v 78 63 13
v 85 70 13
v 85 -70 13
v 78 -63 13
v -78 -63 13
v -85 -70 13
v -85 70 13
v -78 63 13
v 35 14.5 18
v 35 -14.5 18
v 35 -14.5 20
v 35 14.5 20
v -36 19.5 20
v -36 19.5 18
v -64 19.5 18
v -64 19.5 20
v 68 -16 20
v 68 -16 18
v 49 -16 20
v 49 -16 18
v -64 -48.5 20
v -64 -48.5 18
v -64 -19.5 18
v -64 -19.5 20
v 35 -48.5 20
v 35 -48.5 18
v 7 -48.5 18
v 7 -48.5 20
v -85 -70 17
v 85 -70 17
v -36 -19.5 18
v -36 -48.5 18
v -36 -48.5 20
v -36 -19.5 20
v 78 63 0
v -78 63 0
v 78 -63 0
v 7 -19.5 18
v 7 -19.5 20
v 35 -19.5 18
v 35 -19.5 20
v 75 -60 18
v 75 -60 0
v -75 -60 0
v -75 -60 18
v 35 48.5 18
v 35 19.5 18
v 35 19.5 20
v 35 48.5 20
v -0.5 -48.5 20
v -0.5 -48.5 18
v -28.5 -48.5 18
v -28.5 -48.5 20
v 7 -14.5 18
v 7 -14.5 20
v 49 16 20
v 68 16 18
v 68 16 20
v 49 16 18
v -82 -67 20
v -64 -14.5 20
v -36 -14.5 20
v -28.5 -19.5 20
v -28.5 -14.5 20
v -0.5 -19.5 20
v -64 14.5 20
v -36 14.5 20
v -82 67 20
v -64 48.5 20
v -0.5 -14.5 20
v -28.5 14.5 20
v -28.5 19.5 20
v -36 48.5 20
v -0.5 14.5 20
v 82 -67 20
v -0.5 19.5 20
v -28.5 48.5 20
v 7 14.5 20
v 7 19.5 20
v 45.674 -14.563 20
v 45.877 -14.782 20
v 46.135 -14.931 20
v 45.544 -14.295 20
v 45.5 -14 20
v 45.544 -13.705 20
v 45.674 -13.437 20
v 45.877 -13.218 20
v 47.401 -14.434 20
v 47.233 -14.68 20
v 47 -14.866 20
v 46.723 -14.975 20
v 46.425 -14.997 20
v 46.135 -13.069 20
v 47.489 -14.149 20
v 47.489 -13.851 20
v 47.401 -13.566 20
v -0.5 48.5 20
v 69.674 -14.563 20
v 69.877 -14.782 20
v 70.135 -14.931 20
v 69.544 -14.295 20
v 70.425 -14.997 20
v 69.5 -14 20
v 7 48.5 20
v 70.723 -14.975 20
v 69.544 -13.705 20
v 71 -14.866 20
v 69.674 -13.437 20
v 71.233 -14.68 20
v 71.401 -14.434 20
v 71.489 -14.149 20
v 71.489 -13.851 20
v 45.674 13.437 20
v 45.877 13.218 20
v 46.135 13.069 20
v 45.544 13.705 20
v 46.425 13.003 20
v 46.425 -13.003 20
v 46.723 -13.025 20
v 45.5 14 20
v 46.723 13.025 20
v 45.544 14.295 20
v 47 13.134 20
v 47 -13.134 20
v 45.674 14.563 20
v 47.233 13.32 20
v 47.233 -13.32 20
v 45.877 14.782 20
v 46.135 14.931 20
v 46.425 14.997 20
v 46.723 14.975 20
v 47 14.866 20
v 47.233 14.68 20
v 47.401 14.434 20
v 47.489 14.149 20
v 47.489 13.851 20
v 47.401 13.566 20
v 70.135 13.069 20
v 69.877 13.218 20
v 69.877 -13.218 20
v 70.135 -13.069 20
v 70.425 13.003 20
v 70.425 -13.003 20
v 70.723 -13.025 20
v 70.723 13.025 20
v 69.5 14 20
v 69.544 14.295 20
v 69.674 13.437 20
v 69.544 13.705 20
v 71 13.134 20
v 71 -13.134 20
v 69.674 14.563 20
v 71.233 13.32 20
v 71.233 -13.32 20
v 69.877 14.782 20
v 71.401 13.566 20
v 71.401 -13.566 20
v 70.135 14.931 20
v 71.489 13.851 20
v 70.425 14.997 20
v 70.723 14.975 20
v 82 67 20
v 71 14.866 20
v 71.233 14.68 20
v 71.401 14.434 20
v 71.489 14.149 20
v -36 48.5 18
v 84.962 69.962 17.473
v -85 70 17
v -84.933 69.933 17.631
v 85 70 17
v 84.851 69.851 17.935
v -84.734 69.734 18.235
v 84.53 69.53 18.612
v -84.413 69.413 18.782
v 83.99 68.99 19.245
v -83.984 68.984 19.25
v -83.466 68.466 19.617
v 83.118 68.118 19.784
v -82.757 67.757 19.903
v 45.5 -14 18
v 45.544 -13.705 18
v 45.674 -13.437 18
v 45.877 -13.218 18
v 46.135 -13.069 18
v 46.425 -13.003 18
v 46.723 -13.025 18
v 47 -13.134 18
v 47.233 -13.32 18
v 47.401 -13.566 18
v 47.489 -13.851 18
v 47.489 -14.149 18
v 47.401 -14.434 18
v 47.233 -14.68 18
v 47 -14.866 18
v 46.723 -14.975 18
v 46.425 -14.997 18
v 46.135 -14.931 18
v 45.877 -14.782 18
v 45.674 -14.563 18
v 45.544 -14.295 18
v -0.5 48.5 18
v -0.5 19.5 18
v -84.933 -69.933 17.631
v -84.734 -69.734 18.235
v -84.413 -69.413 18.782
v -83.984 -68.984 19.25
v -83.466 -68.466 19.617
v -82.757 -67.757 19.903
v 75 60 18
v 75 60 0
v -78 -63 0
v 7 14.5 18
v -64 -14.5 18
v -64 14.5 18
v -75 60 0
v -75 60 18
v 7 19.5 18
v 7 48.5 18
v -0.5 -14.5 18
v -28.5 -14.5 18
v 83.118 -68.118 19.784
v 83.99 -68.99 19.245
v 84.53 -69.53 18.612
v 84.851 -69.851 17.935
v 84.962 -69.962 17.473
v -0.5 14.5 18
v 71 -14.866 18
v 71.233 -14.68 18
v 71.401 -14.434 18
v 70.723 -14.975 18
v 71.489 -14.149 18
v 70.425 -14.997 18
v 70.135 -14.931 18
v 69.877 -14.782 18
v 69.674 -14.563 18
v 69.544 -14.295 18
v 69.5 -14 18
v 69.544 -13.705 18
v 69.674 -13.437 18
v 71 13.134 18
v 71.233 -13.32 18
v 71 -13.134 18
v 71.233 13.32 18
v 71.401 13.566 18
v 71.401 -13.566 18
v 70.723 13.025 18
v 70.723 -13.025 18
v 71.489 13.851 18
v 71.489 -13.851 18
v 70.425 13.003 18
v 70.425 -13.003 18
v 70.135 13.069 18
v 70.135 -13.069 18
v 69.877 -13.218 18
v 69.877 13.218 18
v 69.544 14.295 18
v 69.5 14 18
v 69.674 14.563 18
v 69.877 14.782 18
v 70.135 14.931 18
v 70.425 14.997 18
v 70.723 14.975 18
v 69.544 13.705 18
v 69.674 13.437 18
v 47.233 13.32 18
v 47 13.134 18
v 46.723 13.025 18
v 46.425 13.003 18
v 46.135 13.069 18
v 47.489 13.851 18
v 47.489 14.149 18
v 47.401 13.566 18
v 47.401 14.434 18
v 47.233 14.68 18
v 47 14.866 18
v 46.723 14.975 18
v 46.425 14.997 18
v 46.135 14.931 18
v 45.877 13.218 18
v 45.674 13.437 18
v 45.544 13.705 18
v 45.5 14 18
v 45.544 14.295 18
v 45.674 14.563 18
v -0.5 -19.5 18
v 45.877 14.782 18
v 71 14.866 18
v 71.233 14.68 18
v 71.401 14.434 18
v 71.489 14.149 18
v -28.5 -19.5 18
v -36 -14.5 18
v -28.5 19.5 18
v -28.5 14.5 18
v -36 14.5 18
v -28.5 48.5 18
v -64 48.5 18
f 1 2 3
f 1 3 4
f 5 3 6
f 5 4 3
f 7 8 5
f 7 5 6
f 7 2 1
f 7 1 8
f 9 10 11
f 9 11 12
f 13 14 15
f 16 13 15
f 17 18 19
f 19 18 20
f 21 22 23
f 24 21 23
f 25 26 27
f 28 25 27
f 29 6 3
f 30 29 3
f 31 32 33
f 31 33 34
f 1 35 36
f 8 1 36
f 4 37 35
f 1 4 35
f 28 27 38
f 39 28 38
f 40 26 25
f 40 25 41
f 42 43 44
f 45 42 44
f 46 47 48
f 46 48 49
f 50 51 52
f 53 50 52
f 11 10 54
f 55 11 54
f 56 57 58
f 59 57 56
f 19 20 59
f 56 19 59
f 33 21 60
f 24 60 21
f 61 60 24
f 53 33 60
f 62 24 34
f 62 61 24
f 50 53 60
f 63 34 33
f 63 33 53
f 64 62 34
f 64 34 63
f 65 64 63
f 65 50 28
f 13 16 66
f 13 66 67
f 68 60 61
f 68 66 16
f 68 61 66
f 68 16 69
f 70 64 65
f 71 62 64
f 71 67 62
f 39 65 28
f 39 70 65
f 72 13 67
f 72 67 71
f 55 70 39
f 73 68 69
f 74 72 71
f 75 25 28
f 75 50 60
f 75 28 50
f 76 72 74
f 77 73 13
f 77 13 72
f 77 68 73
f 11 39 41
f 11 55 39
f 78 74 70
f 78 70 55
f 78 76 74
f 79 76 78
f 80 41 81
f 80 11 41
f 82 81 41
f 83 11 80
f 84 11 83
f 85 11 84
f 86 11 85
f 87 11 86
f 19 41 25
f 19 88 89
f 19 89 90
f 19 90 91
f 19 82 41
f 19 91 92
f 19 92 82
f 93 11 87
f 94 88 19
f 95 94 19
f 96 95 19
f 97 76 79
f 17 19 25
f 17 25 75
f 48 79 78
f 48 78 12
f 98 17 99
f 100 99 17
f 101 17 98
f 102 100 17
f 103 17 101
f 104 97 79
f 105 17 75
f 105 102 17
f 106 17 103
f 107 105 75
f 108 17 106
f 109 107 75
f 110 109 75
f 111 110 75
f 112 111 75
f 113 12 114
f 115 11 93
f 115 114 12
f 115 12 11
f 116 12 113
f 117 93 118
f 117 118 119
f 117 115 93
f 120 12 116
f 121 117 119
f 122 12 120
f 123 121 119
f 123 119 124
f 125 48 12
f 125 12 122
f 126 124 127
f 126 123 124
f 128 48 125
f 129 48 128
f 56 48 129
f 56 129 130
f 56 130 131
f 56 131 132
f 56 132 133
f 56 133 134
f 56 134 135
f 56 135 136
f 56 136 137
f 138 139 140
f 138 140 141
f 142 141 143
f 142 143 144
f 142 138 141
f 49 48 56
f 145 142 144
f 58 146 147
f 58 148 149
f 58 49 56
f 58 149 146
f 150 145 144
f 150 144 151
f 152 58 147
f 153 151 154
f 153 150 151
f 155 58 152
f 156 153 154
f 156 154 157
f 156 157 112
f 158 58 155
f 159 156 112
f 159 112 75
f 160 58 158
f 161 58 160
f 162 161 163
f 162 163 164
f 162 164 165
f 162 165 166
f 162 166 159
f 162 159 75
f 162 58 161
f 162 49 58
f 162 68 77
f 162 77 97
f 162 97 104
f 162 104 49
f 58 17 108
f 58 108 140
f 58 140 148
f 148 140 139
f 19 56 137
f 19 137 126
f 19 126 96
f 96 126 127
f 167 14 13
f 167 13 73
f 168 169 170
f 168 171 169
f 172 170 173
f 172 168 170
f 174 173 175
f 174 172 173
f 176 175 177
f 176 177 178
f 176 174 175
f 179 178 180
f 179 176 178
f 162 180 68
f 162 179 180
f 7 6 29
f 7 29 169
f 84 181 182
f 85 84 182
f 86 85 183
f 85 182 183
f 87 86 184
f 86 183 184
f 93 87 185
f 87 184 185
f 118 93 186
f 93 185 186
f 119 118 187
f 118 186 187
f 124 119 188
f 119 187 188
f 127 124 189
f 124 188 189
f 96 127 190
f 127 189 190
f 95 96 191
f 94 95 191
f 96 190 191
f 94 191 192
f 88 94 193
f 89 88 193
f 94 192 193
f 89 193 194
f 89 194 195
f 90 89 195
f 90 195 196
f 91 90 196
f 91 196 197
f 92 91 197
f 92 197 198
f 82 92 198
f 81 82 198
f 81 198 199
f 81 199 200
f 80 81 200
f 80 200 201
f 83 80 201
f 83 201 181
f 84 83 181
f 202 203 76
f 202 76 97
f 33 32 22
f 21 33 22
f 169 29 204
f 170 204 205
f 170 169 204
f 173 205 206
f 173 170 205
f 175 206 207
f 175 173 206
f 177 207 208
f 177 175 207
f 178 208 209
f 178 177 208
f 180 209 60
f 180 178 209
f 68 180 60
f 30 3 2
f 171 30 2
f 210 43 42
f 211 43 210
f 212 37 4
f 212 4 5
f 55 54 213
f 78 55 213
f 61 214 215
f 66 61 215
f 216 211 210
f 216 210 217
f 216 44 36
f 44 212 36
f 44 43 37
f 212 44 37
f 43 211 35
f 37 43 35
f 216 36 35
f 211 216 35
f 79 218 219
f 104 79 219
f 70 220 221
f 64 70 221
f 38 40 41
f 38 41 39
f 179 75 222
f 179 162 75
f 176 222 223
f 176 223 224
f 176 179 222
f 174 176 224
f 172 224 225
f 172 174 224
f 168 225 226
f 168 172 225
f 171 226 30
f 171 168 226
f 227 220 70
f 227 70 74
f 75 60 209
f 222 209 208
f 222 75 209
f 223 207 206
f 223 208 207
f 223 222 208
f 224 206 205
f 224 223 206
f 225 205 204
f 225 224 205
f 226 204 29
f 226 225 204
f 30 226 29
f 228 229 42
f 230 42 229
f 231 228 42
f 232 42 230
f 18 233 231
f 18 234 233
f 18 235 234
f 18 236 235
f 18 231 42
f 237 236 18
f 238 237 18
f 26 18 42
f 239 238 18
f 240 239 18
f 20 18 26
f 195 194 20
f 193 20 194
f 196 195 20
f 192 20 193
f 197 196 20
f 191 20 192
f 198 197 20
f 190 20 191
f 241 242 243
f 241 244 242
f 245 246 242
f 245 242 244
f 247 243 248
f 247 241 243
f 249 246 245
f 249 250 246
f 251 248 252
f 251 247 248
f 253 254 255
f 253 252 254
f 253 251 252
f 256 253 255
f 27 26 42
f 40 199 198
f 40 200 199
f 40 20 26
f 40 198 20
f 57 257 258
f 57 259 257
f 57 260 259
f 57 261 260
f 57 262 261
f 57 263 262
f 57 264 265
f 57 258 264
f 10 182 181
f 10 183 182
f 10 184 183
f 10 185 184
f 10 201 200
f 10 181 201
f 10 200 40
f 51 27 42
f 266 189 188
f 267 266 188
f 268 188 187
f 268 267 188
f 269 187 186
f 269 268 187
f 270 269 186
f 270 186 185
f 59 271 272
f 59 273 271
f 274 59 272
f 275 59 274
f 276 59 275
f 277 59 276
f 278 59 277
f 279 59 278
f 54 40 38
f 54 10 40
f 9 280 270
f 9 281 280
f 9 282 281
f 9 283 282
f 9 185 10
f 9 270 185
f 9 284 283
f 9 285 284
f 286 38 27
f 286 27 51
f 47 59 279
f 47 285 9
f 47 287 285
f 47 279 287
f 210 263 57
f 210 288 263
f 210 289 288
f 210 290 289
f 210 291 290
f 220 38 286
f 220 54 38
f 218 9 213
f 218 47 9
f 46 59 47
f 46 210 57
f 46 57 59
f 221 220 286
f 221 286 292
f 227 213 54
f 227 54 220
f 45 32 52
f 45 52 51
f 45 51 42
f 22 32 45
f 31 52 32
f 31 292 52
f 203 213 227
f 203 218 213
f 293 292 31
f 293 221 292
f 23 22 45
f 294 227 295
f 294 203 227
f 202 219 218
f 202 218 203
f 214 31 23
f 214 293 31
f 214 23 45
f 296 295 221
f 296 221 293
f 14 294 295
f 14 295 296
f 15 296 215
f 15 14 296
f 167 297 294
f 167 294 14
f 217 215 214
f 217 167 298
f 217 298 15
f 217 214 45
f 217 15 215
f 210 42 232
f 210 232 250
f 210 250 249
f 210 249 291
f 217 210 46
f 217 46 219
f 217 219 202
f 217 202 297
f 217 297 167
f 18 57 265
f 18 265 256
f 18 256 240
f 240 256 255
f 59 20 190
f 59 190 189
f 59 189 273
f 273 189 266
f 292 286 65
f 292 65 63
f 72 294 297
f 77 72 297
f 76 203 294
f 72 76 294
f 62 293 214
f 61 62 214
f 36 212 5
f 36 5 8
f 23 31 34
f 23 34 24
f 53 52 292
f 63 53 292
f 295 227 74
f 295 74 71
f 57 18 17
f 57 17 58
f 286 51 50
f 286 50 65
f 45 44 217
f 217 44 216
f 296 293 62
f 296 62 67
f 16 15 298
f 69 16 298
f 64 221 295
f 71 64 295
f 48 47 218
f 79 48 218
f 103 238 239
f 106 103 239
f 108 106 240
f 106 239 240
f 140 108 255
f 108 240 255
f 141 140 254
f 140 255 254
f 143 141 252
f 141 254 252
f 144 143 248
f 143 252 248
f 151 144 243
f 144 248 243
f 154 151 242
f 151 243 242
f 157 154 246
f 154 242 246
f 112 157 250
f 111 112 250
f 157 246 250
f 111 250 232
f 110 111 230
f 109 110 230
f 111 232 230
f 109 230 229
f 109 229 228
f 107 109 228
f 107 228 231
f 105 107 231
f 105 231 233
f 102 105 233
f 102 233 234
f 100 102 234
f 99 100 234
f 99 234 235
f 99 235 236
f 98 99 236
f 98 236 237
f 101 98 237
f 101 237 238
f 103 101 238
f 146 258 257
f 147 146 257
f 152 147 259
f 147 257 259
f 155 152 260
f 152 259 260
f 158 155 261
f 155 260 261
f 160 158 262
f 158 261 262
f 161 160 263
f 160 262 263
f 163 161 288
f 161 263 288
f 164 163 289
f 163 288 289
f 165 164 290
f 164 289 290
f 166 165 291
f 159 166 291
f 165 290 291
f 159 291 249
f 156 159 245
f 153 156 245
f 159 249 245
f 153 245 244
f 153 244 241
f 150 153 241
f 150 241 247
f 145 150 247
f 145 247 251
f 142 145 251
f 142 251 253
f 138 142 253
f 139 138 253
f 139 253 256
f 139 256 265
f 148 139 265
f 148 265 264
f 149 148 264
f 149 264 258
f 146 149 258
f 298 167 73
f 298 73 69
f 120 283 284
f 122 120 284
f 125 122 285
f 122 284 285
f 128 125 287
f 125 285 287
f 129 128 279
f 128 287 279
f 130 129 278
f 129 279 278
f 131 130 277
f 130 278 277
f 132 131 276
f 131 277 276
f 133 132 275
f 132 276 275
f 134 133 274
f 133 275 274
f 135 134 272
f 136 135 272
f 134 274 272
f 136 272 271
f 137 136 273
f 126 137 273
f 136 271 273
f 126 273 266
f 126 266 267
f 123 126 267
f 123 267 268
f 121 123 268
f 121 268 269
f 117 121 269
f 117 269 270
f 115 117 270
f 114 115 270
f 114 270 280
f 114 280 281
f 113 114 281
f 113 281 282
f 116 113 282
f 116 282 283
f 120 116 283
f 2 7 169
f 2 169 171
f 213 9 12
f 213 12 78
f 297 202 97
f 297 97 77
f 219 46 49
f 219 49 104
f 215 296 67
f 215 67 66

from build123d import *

# Parameters (mm, degrees)
CROQUIS1_W              = 170
CROQUIS1_H              = 140
SALIENTE_EXTRUIR1_DEPTH = 20
CROQUIS2_W              = 170
CROQUIS2_H              = 140
CROQUIS2_W_2            = 156
CROQUIS2_H_2            = 126
CORTAR_EXTRUIR1_DEPTH   = 13
CROQUIS3_W              = 150
CROQUIS3_H              = 120
CORTAR_EXTRUIR2_DEPTH   = 18
CROQUIS4_R              = 1
CROQUIS4_W              = 28
CROQUIS4_H              = 29
CROQUIS4_W_2            = 19
CROQUIS4_H_2            = 32
CORTAR_EXTRUIR3_DEPTH   = 18
REDONDEO1_R             = 3


with BuildPart() as part:
    # Croquis1 → Saliente-Extruir1 (new body)
    with BuildSketch(Plane.XY):
        Rectangle(CROQUIS1_W, CROQUIS1_H)
    extrude(amount=SALIENTE_EXTRUIR1_DEPTH)

    # Croquis2 → Cortar-Extruir1 (cut)
    with BuildSketch(Plane(origin=(0, 0, 0), x_dir=(-1, 0, 0), z_dir=(0, 0, -1))):
        Rectangle(CROQUIS2_W, CROQUIS2_H)
        Rectangle(CROQUIS2_W_2, CROQUIS2_H_2, mode=Mode.SUBTRACT)
    extrude(amount=-CORTAR_EXTRUIR1_DEPTH, mode=Mode.SUBTRACT)

    # Croquis3 → Cortar-Extruir2 (cut)
    with BuildSketch(Plane(origin=(0, 0, 0), x_dir=(-1, 0, 0), z_dir=(0, 0, -1))):
        Rectangle(CROQUIS3_W, CROQUIS3_H)
    extrude(amount=-CORTAR_EXTRUIR2_DEPTH, mode=Mode.SUBTRACT)

    # Croquis4 → Cortar-Extruir3 (cut)
    with BuildSketch(Plane(origin=(0, 0, 18), x_dir=(-1, 0, 0), z_dir=(0, 0, -1))):
        with Locations((-46.5, -14)):
            Circle(CROQUIS4_R)
        with Locations((-46.5, 14)):
            Circle(CROQUIS4_R)
        with Locations((-70.5, -14)):
            Circle(CROQUIS4_R)
        with Locations((-70.5, 14)):
            Circle(CROQUIS4_R)
        with Locations((50, -34)):
            Rectangle(CROQUIS4_W, CROQUIS4_H)
        with Locations((50, 0)):
            Rectangle(CROQUIS4_W, CROQUIS4_H)
        with Locations((50, 34)):
            Rectangle(CROQUIS4_W, CROQUIS4_H)
        with Locations((14.5, 0)):
            Rectangle(CROQUIS4_W, CROQUIS4_H)
        with Locations((14.5, -34)):
            Rectangle(CROQUIS4_W, CROQUIS4_H)
        with Locations((-21, -34)):
            Rectangle(CROQUIS4_W, CROQUIS4_H)
        with Locations((14.5, 34)):
            Rectangle(CROQUIS4_W, CROQUIS4_H)
        with Locations((-21, 0)):
            Rectangle(CROQUIS4_W, CROQUIS4_H)
        with Locations((-21, 34)):
            Rectangle(CROQUIS4_W, CROQUIS4_H)
        with Locations((-58.5, 0)):
            Rectangle(CROQUIS4_W_2, CROQUIS4_H_2)
    extrude(amount=-CORTAR_EXTRUIR3_DEPTH, mode=Mode.SUBTRACT)

    # Redondeo1
    redondeo1_edges = [part.edges().sort_by_distance(p)[0] for p in [
        (-85, 0, 20),
        (0, -70, 20),
        (85, 0, 20),
        (0, 70, 20),
    ]]
    fillet(redondeo1_edges, radius=REDONDEO1_R)


solid = part.part
